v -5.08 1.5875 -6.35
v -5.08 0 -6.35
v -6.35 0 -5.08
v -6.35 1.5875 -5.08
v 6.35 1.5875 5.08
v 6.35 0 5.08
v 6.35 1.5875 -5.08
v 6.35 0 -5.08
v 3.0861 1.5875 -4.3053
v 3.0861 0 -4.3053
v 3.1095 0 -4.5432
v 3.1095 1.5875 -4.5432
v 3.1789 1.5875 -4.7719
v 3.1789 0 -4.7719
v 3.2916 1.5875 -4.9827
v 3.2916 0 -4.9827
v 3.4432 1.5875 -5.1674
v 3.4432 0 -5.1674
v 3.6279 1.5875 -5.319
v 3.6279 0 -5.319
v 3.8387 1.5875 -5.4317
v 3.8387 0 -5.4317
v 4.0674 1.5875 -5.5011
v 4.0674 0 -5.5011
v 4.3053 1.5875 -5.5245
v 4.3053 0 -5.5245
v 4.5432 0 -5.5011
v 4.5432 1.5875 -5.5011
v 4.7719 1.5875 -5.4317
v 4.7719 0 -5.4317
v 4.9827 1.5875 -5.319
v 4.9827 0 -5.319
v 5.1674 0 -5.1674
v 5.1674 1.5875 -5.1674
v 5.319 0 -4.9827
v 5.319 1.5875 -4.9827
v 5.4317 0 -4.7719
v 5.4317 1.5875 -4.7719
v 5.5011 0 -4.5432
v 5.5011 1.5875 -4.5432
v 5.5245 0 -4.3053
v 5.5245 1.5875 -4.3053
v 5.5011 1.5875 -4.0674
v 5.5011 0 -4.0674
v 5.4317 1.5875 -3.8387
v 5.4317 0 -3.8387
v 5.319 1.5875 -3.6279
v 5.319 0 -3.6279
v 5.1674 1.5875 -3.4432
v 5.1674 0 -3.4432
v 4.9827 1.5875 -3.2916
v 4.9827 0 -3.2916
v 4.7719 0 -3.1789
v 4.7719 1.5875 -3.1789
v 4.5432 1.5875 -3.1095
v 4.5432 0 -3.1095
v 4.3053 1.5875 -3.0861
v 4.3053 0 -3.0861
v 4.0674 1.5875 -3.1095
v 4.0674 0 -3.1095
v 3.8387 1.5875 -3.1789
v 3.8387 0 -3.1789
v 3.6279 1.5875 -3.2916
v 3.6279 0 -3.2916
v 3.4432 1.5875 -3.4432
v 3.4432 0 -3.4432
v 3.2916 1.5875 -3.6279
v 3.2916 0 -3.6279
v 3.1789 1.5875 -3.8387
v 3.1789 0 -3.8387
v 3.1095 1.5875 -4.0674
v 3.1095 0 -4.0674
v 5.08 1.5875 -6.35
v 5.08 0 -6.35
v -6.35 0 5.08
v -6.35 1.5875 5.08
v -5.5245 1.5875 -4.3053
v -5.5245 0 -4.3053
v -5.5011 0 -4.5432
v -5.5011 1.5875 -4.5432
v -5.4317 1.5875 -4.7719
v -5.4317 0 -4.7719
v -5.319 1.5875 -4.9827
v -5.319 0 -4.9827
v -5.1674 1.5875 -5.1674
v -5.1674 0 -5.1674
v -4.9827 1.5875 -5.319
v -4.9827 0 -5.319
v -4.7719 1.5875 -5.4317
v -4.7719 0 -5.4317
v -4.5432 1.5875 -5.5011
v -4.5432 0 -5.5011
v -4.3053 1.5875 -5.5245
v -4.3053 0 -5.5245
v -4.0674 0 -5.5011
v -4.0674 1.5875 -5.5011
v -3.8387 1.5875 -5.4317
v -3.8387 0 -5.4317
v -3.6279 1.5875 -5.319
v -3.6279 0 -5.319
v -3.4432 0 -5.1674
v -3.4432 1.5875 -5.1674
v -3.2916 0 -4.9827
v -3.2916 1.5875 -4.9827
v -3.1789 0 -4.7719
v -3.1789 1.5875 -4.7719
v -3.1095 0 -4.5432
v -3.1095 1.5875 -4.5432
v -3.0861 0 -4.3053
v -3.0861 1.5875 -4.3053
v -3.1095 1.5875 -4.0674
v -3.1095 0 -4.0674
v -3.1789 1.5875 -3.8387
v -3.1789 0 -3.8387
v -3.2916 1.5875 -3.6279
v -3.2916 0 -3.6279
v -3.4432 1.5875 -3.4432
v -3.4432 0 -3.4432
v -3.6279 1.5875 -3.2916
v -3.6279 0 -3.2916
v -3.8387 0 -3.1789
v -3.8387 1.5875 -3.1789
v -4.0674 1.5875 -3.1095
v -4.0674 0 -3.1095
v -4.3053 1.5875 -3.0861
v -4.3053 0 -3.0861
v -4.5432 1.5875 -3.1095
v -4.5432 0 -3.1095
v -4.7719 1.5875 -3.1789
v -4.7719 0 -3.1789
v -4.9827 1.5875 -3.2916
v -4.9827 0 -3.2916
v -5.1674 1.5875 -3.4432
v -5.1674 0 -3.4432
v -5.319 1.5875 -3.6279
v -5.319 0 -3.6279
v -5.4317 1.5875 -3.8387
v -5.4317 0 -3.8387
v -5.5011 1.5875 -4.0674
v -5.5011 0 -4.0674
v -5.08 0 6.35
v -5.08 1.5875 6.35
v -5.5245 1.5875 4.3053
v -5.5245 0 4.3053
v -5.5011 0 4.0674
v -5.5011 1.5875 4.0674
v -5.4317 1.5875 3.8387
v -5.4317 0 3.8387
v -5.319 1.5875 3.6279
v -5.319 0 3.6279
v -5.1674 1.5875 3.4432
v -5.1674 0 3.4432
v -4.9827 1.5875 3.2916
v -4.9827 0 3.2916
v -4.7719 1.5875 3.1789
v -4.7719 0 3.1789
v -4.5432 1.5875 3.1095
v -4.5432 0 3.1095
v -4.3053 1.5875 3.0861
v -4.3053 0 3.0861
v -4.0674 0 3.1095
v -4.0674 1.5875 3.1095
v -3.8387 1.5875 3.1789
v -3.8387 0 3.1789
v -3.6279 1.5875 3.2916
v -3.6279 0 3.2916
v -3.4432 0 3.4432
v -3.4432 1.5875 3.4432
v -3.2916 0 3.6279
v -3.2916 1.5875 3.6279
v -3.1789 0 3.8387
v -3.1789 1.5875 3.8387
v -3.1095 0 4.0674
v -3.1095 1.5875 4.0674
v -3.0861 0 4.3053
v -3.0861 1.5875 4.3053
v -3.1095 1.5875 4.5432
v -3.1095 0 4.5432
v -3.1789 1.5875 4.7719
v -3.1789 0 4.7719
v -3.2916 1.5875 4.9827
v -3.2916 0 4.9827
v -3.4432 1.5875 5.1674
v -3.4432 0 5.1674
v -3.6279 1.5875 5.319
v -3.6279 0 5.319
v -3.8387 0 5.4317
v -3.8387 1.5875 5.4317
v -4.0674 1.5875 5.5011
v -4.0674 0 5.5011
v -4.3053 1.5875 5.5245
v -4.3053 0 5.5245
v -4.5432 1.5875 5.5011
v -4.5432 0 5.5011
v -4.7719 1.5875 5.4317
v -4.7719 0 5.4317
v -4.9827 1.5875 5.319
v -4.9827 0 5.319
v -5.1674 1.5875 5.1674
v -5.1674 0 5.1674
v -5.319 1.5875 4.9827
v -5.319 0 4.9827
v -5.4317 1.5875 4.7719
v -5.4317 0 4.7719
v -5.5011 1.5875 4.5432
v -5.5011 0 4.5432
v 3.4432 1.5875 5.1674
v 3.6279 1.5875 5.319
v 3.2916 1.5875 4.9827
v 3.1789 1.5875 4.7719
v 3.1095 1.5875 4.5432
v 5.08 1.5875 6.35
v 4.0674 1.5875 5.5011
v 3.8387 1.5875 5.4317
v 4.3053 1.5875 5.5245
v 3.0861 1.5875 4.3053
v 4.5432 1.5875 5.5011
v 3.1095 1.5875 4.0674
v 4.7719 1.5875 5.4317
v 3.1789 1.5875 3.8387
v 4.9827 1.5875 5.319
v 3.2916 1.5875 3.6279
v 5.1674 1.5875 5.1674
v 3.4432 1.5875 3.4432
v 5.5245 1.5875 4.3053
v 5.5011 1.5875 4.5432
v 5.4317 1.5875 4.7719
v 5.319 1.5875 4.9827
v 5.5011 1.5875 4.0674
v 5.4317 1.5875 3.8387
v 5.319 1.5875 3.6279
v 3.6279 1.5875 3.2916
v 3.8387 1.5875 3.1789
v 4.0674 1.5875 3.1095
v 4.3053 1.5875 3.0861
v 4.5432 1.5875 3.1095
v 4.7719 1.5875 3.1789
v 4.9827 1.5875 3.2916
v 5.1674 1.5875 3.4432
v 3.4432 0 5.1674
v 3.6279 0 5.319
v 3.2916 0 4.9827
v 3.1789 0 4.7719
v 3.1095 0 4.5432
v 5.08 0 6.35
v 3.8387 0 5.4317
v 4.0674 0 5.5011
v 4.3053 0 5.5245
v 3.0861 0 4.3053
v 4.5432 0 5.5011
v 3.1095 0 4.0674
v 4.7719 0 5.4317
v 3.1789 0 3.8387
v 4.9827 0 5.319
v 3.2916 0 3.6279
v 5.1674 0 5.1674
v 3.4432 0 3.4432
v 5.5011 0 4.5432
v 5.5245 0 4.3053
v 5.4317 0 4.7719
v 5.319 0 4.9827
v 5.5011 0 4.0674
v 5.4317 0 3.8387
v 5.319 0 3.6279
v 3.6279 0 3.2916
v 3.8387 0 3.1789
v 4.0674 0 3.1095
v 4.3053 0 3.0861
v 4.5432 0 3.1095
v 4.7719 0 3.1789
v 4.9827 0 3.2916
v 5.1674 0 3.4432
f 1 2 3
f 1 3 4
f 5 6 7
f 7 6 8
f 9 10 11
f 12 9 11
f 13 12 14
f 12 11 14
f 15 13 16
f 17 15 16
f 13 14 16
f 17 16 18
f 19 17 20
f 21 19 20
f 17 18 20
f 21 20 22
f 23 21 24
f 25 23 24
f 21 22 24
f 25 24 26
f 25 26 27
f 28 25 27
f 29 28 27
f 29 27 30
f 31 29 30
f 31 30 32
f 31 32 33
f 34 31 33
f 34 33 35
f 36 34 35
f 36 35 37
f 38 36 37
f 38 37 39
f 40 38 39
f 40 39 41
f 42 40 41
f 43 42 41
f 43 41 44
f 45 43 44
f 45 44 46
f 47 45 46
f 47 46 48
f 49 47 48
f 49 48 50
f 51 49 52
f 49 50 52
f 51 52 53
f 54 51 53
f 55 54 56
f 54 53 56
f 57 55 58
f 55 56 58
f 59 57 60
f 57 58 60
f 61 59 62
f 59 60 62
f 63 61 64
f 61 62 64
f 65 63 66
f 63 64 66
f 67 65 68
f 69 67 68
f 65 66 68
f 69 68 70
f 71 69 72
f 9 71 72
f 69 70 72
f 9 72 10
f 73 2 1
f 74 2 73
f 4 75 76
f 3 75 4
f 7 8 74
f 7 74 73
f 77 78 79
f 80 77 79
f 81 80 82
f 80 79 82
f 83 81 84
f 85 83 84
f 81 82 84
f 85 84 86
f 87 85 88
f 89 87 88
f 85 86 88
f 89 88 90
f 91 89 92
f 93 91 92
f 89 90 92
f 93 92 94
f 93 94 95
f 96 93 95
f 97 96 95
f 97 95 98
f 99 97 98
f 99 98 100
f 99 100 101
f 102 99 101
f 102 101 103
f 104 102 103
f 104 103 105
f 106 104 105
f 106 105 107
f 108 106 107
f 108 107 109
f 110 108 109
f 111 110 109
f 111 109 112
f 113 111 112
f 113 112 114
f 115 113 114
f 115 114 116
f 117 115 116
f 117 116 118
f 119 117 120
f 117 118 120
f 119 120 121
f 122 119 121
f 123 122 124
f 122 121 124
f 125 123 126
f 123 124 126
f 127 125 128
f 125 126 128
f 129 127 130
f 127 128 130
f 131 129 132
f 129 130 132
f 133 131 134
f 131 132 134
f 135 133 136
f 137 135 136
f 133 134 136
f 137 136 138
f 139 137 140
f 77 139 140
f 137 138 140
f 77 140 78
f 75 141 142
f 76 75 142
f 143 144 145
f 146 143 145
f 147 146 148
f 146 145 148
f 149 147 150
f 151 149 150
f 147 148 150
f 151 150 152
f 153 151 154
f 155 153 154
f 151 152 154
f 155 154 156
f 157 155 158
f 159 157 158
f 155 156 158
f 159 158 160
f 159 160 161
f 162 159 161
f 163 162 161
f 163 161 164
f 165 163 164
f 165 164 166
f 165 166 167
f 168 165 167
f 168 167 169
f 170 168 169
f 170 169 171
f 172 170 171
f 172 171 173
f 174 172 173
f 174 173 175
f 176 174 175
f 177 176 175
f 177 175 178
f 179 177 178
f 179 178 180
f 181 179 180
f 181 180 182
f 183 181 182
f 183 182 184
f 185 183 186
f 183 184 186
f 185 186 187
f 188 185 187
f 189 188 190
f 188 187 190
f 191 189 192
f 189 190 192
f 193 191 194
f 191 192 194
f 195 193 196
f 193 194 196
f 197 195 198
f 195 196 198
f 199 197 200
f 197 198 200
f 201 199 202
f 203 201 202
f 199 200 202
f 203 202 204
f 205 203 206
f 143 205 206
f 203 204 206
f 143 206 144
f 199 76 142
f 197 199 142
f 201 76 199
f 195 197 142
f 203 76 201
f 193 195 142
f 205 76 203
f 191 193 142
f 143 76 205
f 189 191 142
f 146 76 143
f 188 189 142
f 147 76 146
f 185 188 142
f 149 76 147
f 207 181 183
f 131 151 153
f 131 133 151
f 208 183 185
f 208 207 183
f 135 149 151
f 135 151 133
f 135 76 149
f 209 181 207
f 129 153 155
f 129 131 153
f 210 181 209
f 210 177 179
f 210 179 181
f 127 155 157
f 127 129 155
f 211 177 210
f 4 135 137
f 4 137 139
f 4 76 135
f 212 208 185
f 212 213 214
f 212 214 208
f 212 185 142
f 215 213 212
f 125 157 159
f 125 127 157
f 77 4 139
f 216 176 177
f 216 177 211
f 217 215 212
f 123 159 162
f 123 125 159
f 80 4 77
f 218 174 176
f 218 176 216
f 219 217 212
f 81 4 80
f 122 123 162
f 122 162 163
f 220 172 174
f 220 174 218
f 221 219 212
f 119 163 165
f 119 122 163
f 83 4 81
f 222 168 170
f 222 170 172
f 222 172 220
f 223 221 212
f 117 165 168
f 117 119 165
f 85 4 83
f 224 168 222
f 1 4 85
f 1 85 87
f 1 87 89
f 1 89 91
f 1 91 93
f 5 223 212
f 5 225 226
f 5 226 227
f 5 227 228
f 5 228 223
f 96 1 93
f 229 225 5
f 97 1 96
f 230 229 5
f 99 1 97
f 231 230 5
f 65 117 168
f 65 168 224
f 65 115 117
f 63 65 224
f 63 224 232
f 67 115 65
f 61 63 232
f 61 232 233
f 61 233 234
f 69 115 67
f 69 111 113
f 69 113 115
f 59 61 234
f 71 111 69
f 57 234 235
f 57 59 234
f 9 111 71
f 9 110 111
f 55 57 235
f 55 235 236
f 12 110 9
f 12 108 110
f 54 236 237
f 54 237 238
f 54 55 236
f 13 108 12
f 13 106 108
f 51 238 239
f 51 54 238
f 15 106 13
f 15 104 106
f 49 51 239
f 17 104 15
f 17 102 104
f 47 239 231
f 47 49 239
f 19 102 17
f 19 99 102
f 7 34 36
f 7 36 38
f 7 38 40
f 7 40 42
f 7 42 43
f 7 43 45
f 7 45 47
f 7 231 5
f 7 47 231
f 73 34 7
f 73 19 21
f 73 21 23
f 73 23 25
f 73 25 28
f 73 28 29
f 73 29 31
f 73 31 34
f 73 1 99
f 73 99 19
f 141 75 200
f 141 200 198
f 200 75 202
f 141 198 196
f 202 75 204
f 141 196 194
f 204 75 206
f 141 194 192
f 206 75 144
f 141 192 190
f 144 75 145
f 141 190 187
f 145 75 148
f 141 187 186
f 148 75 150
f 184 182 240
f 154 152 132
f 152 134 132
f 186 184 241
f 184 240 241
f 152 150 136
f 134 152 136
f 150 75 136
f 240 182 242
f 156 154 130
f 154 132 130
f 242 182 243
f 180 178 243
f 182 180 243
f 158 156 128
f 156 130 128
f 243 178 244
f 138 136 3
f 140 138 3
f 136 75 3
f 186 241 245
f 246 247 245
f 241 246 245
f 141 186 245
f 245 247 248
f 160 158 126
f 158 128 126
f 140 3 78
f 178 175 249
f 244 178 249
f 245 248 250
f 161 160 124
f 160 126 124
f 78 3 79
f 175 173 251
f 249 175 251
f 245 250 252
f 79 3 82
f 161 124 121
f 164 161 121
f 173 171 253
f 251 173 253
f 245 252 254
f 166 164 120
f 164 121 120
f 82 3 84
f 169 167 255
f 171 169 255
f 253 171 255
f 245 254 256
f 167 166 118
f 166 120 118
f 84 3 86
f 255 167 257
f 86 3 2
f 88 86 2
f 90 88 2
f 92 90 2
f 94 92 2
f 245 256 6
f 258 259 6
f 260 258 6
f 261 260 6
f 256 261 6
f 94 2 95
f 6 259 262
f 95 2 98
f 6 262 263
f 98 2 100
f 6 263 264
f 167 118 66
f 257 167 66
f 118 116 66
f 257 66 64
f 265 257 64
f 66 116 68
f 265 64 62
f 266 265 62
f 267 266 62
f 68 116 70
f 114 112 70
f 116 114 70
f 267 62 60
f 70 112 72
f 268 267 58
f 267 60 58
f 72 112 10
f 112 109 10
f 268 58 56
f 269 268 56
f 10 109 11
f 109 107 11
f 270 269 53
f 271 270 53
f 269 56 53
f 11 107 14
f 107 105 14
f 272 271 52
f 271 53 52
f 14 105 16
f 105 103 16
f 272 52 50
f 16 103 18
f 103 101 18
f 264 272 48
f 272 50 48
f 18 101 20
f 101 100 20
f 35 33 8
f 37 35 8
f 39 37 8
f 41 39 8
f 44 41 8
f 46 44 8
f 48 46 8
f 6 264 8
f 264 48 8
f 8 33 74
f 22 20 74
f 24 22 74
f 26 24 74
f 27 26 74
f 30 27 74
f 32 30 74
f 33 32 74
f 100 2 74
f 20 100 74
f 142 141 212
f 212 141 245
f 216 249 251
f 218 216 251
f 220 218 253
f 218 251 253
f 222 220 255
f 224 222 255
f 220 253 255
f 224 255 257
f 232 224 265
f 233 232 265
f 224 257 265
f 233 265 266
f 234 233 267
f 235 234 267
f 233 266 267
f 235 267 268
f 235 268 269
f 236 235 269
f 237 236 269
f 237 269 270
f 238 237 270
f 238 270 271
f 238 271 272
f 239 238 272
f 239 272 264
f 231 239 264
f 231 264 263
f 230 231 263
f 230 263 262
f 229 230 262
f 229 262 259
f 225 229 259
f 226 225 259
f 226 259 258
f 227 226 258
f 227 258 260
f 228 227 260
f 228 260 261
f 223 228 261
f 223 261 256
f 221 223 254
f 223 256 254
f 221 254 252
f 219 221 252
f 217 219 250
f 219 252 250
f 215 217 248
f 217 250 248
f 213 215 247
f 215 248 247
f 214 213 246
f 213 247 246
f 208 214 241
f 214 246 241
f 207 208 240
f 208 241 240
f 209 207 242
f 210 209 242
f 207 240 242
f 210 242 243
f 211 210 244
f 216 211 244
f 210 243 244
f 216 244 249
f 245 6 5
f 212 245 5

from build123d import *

# Parameters (mm, degrees)
SKETCH1_W             = 12.7
SKETCH1_H             = 12.7
BOSS_EXTRUDE1_DEPTH   = 1.5875
F_2_CLEARANCE_HOLE1_D = 2.4384
CHAMFER1_SIZE         = 1.27


with BuildPart() as part:
    # Sketch1 → Boss-Extrude1 (new body)
    with BuildSketch(Plane(origin=(0, 0, 0), x_dir=(1, 0, 0), z_dir=(0, 1, 0))):
        Rectangle(SKETCH1_W, SKETCH1_H)
    extrude(amount=BOSS_EXTRUDE1_DEPTH)

    # #2 Clearance Hole1 (through all)
    with Locations(Plane(origin=(0, 1.5875, 0), x_dir=(1, 0, 0), z_dir=(0, 1, 0))):
        with Locations((-4.3053, 4.3053), (4.3053, 4.3053), (4.3053, -4.3053), (-4.3053, -4.3053)):
            Hole(F_2_CLEARANCE_HOLE1_D / 2)

    # Chamfer1
    chamfer1_edges = [part.edges().sort_by_distance(p)[0] for p in [
        (6.35, 0.79375, 6.35),
        (-6.35, 0.79375, 6.35),
        (-6.35, 0.79375, -6.35),
        (6.35, 0.79375, -6.35),
    ]]
    chamfer(chamfer1_edges, length=CHAMFER1_SIZE)


solid = part.part
